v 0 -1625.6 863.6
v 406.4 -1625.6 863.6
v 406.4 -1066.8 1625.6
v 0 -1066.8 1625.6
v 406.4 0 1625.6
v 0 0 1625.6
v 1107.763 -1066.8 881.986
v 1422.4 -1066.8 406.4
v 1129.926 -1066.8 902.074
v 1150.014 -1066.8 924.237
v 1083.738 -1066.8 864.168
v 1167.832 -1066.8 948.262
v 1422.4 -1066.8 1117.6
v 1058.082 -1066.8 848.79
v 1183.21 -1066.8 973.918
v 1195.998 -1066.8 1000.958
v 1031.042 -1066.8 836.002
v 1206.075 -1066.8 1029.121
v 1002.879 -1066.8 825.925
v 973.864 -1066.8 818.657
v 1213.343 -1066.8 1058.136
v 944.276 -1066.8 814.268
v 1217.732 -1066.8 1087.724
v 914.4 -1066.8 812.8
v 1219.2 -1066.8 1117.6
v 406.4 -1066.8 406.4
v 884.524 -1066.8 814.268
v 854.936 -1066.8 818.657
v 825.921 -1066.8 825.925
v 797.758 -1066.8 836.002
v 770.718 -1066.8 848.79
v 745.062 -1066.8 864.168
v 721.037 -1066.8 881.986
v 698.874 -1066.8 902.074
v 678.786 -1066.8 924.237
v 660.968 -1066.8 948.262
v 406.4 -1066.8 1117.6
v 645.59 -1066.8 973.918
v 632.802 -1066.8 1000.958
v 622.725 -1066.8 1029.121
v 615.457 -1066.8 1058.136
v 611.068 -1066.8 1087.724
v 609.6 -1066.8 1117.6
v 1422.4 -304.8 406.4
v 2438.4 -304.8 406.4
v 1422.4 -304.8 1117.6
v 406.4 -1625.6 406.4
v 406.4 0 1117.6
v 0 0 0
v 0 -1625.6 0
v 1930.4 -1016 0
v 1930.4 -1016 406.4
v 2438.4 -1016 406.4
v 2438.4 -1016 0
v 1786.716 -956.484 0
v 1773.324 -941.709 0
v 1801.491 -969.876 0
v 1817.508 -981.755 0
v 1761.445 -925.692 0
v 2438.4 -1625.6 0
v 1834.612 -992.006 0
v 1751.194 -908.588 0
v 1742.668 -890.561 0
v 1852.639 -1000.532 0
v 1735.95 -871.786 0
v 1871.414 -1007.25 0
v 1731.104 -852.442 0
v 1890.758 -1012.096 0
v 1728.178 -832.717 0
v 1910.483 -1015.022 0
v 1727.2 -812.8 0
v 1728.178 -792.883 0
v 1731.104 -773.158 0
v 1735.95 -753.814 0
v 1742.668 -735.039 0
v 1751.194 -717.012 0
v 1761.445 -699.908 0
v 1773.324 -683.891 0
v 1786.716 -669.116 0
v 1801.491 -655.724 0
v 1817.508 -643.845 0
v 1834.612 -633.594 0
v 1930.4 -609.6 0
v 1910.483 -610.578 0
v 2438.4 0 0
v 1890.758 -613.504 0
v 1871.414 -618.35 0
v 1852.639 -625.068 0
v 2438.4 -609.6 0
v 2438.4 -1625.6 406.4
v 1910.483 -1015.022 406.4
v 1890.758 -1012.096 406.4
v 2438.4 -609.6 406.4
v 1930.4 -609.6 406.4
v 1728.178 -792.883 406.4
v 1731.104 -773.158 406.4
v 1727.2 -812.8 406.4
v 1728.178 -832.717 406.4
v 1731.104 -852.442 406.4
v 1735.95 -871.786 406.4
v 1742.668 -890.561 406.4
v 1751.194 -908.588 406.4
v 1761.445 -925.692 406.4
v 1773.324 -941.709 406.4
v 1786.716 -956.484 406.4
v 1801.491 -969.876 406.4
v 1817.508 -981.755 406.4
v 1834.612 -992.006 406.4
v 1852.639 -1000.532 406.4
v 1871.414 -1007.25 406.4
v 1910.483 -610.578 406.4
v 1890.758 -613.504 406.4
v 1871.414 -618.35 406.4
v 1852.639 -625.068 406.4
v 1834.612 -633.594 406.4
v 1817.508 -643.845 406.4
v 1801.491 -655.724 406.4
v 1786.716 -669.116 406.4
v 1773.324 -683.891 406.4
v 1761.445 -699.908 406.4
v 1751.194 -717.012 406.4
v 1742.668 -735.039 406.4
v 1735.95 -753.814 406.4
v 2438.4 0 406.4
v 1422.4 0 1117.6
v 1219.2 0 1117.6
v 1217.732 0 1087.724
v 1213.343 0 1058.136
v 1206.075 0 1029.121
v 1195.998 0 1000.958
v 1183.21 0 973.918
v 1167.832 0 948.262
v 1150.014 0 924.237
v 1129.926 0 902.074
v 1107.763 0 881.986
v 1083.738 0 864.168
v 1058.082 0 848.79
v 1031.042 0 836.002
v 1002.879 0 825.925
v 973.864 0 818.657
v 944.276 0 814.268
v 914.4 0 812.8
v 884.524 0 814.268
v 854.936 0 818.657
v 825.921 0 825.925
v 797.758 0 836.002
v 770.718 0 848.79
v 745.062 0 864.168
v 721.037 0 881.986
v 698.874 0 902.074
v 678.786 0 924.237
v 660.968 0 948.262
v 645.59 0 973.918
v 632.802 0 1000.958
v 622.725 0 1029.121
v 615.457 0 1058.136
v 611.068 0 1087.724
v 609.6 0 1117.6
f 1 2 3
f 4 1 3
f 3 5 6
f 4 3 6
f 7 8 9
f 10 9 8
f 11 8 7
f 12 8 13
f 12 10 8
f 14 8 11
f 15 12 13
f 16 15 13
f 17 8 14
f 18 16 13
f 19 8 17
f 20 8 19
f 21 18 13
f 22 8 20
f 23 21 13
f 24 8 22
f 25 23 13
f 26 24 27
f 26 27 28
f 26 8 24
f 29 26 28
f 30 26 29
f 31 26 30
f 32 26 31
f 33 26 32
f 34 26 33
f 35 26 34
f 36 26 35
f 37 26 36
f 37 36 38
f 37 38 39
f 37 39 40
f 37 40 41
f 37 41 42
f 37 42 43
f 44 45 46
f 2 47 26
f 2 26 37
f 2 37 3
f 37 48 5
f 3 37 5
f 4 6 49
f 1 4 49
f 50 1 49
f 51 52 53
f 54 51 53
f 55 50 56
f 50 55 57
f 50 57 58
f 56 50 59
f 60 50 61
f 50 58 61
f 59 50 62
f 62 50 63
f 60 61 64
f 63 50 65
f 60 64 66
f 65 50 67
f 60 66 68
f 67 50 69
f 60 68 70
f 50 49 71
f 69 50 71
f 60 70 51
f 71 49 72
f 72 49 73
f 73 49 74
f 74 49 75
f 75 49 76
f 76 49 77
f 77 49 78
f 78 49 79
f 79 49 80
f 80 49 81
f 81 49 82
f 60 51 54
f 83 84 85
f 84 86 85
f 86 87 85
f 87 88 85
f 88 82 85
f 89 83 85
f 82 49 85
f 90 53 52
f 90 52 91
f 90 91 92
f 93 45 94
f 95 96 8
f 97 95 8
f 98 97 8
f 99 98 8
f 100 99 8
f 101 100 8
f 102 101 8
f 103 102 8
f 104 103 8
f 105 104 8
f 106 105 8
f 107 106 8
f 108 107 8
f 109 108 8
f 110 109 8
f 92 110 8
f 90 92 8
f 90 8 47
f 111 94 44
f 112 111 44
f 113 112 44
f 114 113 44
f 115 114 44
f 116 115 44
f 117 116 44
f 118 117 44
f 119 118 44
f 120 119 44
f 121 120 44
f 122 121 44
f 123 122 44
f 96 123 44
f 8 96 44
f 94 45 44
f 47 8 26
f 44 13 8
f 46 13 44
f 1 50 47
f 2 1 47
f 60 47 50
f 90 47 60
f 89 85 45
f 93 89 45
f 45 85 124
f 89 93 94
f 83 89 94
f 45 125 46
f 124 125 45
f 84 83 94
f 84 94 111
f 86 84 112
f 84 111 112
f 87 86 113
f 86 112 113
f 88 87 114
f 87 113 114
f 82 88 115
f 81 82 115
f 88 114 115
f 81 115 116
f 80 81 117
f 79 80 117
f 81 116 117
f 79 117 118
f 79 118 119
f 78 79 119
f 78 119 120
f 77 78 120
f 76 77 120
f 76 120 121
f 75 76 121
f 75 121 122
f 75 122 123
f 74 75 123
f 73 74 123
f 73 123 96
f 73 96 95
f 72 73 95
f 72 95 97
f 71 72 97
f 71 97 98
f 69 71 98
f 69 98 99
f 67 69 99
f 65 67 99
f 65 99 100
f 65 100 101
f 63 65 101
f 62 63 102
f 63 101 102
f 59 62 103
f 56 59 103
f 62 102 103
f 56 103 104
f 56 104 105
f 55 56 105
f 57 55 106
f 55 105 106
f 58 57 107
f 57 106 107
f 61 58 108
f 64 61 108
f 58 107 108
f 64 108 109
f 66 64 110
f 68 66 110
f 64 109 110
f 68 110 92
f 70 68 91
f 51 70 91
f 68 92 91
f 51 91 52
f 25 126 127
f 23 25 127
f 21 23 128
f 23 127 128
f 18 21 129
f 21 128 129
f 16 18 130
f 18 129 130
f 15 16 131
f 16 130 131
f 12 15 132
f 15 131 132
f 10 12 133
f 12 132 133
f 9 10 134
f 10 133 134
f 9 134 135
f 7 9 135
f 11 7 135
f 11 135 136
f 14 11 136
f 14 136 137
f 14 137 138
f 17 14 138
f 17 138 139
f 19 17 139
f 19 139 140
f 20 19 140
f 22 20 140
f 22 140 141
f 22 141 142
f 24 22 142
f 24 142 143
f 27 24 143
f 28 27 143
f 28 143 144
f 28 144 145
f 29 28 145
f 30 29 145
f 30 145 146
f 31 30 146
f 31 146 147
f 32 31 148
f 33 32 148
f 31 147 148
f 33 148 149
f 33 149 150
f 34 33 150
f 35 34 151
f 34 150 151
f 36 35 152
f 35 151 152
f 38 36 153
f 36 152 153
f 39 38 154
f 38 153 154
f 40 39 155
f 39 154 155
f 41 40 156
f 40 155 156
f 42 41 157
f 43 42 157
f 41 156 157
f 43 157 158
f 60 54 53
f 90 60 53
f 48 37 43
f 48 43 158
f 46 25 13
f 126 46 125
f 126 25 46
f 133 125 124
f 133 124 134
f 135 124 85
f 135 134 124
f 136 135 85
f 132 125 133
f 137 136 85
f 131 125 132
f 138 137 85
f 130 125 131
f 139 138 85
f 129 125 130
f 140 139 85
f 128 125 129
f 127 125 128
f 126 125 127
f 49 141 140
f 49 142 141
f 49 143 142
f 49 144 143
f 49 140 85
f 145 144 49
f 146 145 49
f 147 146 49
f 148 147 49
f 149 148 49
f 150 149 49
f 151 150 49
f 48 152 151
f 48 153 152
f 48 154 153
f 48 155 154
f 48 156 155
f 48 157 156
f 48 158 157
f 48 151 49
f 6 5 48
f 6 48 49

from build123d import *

# Parameters (mm, degrees)
F1_DEPTH  = 1625.6
F3_DEPTH  = 406.401
F5_W      = 1066.8
F5_H      = 711.2
F6_DEPTH  = 1016
F8_DEPTH  = 1625.601
F10_DEPTH = 304.8
F12_DEPTH = 406.401


with BuildPart() as f1:
    # F0 (on Front) → F1 (new body)
    with BuildSketch(Plane.XZ):
        Polygon((0, 1625.6), (0, 0), (2438.4, 0), (2438.4, 406.4), (406.4, 406.4), (406.4, 1625.6), align=None)
    extrude(amount=F1_DEPTH)

    # F2 (on face) → F3 (cut, through all)
    with BuildSketch(Plane.XY.offset(406.4)):
        with BuildLine():
            Line((2438.4, -1016), (2438.4, -609.6))
            Line((2438.4, -609.6), (1930.4, -609.6))
            ThreePointArc((1930.4, -609.6), (1727.2, -812.8), (1930.4, -1016))
            Line((1930.4, -1016), (2438.4, -1016))
        make_face()
    extrude(amount=-F3_DEPTH, mode=Mode.SUBTRACT)

    # F5 (on face) → F6 (join)
    with BuildSketch(Plane.YZ.offset(406.4)):
        with Locations((-533.4, 762)):
            Rectangle(F5_W, F5_H)
    extrude(amount=F6_DEPTH)

    # F7 (on face) → F8 (cut, through all)
    with BuildSketch(Plane(origin=(0, 0, 0), x_dir=(-1, 0, 0), z_dir=(0, 1, 0))):
        with BuildLine():
            Line((-914.4, 1117.6), (-1219.2, 1117.6))
            ThreePointArc((-1219.2, 1117.6), (-914.4, 812.8), (-609.6, 1117.6))
            Line((-609.6, 1117.6), (-914.4, 1117.6))
        make_face()
    extrude(amount=-F8_DEPTH, mode=Mode.SUBTRACT)

    # F9 (on face) → F10 (join)
    with BuildSketch(Plane(origin=(0, 0, 0), x_dir=(-1, 0, 0), z_dir=(0, 1, 0))):
        Polygon((-1422.4, 406.4), (-1422.4, 1117.6), (-2438.4, 406.4), align=None)
    extrude(amount=-F10_DEPTH)

    # F11 (on face) → F12 (cut, through all)
    with BuildSketch(Plane.YZ.offset(406.4)):
        Polygon((-1625.6, 1625.6), (-1625.6, 863.6), (-1066.8, 1625.6), align=None)
    extrude(amount=-F12_DEPTH, mode=Mode.SUBTRACT)


solid = f1.part
